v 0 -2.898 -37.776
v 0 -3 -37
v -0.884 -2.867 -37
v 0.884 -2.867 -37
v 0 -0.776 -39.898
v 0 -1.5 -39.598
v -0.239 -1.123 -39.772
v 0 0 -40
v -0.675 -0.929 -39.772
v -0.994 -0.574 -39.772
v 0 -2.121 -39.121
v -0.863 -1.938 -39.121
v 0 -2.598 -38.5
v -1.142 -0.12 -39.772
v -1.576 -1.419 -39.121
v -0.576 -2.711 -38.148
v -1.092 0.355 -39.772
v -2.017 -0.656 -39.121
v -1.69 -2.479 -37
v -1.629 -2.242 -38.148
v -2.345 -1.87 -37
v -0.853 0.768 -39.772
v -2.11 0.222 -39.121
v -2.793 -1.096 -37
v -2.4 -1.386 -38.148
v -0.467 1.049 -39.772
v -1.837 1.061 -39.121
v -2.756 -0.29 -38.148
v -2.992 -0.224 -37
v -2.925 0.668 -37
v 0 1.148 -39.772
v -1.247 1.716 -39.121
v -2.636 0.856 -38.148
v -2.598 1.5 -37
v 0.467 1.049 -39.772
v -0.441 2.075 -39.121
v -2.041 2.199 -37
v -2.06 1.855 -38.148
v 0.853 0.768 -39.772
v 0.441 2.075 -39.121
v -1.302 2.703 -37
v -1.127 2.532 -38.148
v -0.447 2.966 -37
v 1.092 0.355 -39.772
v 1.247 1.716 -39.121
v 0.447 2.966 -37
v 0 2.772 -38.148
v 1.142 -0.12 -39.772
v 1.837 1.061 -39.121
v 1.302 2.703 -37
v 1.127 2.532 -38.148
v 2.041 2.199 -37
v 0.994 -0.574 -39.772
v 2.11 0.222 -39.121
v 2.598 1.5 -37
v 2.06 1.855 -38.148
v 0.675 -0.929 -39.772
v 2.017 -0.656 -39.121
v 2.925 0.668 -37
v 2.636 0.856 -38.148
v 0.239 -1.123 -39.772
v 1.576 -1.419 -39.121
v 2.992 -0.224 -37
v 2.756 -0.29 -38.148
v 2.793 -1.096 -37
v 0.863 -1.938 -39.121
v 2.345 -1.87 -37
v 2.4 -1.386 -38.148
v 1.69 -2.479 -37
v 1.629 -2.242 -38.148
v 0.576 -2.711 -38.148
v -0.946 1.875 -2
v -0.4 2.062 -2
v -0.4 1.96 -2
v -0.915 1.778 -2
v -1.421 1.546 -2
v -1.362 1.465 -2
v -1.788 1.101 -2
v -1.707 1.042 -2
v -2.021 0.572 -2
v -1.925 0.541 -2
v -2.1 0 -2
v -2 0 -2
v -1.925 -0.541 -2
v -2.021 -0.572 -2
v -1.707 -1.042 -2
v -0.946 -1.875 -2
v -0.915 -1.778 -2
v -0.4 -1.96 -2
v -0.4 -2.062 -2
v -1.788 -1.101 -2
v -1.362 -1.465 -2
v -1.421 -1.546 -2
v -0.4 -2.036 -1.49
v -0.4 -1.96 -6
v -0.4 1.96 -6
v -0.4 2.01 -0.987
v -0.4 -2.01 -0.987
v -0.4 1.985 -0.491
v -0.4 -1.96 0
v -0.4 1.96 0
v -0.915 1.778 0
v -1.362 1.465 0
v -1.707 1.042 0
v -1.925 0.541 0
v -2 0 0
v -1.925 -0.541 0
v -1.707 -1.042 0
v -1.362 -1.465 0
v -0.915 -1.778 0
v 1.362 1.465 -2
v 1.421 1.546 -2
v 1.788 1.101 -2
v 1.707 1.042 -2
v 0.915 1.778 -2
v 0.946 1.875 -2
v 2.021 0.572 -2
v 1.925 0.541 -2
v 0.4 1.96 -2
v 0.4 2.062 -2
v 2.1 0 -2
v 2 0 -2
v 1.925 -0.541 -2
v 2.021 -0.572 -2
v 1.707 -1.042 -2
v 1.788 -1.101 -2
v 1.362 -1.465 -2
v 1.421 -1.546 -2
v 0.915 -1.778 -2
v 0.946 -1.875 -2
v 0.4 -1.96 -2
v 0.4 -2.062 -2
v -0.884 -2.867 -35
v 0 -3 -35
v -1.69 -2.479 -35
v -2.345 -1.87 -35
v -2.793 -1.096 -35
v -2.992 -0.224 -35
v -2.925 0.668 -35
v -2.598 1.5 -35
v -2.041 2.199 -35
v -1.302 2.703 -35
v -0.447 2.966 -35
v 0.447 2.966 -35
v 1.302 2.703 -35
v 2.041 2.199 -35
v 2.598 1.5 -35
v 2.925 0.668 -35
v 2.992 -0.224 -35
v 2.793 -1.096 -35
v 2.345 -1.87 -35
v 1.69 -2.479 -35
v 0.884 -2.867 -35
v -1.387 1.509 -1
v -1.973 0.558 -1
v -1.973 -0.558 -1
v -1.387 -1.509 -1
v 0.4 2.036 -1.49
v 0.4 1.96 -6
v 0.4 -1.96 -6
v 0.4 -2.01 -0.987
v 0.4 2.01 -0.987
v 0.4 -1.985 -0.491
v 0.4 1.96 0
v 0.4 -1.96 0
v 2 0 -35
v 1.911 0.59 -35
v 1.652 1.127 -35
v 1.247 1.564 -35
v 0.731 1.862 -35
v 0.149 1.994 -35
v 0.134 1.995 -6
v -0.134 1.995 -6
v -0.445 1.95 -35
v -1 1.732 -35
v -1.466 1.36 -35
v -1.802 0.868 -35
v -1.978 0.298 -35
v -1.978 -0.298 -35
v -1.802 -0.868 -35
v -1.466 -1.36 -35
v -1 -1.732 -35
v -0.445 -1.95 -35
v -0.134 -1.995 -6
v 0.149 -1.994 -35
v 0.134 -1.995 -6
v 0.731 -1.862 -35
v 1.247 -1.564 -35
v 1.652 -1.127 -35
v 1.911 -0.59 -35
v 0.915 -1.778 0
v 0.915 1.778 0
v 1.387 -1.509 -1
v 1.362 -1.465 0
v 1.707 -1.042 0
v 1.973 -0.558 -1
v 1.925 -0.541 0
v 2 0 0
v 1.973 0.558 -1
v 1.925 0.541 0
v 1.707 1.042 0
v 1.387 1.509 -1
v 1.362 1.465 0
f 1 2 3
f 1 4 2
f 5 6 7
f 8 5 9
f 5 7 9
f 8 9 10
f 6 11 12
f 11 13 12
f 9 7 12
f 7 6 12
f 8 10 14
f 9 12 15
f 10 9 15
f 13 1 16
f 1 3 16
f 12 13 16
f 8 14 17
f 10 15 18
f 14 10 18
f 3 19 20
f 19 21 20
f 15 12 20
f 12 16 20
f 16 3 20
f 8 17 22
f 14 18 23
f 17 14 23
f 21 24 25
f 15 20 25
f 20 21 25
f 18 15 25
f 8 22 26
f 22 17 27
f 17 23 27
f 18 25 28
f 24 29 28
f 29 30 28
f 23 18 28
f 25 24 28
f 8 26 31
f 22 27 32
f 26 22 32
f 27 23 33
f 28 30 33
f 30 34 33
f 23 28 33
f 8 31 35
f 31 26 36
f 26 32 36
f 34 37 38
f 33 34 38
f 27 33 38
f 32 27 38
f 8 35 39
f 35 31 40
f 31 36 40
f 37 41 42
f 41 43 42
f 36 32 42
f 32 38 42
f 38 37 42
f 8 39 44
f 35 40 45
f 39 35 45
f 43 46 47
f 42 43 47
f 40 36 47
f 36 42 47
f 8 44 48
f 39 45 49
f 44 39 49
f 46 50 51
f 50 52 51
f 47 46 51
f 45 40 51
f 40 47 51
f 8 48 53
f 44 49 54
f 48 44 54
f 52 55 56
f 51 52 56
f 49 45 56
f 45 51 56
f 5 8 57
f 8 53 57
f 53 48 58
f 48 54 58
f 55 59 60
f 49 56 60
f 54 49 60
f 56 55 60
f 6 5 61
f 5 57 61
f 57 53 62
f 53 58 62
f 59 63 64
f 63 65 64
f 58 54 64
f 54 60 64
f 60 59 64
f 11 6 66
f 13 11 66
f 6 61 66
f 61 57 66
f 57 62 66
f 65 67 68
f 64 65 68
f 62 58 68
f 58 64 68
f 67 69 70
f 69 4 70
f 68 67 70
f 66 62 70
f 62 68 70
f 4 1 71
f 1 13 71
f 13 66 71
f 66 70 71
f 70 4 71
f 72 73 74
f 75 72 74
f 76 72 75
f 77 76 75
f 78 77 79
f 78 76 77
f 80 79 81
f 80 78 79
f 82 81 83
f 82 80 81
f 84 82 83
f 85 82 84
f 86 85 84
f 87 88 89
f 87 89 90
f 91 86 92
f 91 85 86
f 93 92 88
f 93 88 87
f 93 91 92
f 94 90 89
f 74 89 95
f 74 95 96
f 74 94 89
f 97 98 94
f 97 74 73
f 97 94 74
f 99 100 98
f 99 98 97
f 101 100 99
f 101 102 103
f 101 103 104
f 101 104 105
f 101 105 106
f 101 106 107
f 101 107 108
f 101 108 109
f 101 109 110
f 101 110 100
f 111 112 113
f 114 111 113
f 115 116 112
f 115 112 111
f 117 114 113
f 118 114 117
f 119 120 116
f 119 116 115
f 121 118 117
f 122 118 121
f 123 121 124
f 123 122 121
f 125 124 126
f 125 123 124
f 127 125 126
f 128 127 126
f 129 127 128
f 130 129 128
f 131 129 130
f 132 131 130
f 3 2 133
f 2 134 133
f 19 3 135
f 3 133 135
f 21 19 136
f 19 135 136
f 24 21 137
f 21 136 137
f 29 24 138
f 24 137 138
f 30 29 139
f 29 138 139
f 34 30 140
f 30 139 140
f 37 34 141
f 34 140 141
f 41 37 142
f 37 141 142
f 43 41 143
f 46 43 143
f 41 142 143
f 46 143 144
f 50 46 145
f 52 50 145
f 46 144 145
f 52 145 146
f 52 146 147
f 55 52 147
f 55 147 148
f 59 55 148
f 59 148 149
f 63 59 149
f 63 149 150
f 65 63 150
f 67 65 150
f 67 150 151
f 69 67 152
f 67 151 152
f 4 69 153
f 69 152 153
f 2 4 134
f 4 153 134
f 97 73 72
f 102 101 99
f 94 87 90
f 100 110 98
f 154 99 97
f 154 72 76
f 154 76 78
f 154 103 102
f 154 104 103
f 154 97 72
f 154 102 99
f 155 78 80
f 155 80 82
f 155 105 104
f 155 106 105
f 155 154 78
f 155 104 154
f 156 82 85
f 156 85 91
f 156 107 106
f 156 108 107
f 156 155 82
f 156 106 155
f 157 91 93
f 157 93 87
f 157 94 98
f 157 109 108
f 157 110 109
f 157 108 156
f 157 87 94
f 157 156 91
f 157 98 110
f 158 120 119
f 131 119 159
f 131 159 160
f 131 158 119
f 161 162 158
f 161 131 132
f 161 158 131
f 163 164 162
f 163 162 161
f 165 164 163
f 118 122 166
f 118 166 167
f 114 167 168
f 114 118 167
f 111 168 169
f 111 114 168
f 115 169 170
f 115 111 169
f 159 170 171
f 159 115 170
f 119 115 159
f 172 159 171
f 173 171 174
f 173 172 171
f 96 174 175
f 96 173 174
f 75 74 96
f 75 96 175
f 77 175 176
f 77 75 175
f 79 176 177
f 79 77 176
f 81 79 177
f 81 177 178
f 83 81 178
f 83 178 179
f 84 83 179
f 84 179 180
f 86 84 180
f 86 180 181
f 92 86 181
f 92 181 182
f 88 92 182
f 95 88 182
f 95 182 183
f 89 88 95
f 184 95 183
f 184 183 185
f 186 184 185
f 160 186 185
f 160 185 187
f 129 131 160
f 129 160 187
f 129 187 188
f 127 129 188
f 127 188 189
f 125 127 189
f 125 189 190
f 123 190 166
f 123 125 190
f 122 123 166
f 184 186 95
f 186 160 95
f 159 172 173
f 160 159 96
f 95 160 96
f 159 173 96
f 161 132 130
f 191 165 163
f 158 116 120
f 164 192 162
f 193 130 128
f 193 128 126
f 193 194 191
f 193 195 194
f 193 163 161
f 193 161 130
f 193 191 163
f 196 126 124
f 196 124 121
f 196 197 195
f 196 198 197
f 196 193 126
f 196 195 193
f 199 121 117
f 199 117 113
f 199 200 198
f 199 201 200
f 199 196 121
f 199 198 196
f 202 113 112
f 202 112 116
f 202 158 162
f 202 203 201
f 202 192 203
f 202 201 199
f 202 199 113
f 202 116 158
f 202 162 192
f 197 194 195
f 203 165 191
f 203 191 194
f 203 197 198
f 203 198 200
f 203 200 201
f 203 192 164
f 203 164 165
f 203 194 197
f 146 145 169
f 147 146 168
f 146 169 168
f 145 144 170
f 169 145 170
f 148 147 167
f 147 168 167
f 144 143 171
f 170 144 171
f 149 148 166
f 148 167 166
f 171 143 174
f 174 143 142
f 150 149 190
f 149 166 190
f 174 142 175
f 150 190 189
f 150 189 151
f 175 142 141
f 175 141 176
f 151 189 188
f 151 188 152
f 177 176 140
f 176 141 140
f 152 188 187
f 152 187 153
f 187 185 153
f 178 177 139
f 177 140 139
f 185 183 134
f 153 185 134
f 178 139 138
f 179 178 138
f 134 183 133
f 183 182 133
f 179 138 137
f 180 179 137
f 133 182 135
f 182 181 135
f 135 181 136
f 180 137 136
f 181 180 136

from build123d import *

# Parameters (mm, degrees)
SKETCH_1_R          = 2
EXTRUDE_1_DEPTH     = 36
CUT_EXTRUDE_1_DEPTH = 6


with BuildPart() as part:
    # 草图1 → 凸台-拉伸1 (new body)
    with BuildSketch(Plane.XY):
        Circle(SKETCH_1_R)
    extrude(amount=-EXTRUDE_1_DEPTH)

    # 草图2 → 旋转1 (revolve)
    with BuildSketch(Plane(origin=(0, 0, 0), x_dir=(0, 0, -1), z_dir=(1, 0, 0))):
        with BuildLine():
            Line((35, 0), (40, 0))
            ThreePointArc((40, 0), (39.121320344, -2.121320344), (37, -3))
            Line((37, -3), (35, -3))
            Line((35, -3), (35, 0))
        make_face()
    revolve(axis=Axis((0, 0, -35), (0, 0, -1)))

    # 草图3 → 旋转2 (revolve)
    with BuildSketch(Plane(origin=(0, 0, 0), x_dir=(0, 0, -1), z_dir=(1, 0, 0))):
        Polygon((0, 2), (0, 0), (2, 0), (2, 2.1), align=None)
    revolve(axis=Axis((0, 0, -2), (0, 0, 1)))

    # 草图4 → 切除-拉伸1 (cut)
    with BuildSketch(Plane.XY):
        with BuildLine():
            Line((-0.4, -2.061552813), (-0.4, 2.061552813))
            ThreePointArc((-0.4, 2.061552813), (0, 2.1), (0.4, 2.061552813))
            Line((0.4, 2.061552813), (0.4, -2.061552813))
            ThreePointArc((0.4, -2.061552813), (0, -2.1), (-0.4, -2.061552813))
        make_face()
    extrude(amount=-CUT_EXTRUDE_1_DEPTH, mode=Mode.SUBTRACT)


solid = part.part
